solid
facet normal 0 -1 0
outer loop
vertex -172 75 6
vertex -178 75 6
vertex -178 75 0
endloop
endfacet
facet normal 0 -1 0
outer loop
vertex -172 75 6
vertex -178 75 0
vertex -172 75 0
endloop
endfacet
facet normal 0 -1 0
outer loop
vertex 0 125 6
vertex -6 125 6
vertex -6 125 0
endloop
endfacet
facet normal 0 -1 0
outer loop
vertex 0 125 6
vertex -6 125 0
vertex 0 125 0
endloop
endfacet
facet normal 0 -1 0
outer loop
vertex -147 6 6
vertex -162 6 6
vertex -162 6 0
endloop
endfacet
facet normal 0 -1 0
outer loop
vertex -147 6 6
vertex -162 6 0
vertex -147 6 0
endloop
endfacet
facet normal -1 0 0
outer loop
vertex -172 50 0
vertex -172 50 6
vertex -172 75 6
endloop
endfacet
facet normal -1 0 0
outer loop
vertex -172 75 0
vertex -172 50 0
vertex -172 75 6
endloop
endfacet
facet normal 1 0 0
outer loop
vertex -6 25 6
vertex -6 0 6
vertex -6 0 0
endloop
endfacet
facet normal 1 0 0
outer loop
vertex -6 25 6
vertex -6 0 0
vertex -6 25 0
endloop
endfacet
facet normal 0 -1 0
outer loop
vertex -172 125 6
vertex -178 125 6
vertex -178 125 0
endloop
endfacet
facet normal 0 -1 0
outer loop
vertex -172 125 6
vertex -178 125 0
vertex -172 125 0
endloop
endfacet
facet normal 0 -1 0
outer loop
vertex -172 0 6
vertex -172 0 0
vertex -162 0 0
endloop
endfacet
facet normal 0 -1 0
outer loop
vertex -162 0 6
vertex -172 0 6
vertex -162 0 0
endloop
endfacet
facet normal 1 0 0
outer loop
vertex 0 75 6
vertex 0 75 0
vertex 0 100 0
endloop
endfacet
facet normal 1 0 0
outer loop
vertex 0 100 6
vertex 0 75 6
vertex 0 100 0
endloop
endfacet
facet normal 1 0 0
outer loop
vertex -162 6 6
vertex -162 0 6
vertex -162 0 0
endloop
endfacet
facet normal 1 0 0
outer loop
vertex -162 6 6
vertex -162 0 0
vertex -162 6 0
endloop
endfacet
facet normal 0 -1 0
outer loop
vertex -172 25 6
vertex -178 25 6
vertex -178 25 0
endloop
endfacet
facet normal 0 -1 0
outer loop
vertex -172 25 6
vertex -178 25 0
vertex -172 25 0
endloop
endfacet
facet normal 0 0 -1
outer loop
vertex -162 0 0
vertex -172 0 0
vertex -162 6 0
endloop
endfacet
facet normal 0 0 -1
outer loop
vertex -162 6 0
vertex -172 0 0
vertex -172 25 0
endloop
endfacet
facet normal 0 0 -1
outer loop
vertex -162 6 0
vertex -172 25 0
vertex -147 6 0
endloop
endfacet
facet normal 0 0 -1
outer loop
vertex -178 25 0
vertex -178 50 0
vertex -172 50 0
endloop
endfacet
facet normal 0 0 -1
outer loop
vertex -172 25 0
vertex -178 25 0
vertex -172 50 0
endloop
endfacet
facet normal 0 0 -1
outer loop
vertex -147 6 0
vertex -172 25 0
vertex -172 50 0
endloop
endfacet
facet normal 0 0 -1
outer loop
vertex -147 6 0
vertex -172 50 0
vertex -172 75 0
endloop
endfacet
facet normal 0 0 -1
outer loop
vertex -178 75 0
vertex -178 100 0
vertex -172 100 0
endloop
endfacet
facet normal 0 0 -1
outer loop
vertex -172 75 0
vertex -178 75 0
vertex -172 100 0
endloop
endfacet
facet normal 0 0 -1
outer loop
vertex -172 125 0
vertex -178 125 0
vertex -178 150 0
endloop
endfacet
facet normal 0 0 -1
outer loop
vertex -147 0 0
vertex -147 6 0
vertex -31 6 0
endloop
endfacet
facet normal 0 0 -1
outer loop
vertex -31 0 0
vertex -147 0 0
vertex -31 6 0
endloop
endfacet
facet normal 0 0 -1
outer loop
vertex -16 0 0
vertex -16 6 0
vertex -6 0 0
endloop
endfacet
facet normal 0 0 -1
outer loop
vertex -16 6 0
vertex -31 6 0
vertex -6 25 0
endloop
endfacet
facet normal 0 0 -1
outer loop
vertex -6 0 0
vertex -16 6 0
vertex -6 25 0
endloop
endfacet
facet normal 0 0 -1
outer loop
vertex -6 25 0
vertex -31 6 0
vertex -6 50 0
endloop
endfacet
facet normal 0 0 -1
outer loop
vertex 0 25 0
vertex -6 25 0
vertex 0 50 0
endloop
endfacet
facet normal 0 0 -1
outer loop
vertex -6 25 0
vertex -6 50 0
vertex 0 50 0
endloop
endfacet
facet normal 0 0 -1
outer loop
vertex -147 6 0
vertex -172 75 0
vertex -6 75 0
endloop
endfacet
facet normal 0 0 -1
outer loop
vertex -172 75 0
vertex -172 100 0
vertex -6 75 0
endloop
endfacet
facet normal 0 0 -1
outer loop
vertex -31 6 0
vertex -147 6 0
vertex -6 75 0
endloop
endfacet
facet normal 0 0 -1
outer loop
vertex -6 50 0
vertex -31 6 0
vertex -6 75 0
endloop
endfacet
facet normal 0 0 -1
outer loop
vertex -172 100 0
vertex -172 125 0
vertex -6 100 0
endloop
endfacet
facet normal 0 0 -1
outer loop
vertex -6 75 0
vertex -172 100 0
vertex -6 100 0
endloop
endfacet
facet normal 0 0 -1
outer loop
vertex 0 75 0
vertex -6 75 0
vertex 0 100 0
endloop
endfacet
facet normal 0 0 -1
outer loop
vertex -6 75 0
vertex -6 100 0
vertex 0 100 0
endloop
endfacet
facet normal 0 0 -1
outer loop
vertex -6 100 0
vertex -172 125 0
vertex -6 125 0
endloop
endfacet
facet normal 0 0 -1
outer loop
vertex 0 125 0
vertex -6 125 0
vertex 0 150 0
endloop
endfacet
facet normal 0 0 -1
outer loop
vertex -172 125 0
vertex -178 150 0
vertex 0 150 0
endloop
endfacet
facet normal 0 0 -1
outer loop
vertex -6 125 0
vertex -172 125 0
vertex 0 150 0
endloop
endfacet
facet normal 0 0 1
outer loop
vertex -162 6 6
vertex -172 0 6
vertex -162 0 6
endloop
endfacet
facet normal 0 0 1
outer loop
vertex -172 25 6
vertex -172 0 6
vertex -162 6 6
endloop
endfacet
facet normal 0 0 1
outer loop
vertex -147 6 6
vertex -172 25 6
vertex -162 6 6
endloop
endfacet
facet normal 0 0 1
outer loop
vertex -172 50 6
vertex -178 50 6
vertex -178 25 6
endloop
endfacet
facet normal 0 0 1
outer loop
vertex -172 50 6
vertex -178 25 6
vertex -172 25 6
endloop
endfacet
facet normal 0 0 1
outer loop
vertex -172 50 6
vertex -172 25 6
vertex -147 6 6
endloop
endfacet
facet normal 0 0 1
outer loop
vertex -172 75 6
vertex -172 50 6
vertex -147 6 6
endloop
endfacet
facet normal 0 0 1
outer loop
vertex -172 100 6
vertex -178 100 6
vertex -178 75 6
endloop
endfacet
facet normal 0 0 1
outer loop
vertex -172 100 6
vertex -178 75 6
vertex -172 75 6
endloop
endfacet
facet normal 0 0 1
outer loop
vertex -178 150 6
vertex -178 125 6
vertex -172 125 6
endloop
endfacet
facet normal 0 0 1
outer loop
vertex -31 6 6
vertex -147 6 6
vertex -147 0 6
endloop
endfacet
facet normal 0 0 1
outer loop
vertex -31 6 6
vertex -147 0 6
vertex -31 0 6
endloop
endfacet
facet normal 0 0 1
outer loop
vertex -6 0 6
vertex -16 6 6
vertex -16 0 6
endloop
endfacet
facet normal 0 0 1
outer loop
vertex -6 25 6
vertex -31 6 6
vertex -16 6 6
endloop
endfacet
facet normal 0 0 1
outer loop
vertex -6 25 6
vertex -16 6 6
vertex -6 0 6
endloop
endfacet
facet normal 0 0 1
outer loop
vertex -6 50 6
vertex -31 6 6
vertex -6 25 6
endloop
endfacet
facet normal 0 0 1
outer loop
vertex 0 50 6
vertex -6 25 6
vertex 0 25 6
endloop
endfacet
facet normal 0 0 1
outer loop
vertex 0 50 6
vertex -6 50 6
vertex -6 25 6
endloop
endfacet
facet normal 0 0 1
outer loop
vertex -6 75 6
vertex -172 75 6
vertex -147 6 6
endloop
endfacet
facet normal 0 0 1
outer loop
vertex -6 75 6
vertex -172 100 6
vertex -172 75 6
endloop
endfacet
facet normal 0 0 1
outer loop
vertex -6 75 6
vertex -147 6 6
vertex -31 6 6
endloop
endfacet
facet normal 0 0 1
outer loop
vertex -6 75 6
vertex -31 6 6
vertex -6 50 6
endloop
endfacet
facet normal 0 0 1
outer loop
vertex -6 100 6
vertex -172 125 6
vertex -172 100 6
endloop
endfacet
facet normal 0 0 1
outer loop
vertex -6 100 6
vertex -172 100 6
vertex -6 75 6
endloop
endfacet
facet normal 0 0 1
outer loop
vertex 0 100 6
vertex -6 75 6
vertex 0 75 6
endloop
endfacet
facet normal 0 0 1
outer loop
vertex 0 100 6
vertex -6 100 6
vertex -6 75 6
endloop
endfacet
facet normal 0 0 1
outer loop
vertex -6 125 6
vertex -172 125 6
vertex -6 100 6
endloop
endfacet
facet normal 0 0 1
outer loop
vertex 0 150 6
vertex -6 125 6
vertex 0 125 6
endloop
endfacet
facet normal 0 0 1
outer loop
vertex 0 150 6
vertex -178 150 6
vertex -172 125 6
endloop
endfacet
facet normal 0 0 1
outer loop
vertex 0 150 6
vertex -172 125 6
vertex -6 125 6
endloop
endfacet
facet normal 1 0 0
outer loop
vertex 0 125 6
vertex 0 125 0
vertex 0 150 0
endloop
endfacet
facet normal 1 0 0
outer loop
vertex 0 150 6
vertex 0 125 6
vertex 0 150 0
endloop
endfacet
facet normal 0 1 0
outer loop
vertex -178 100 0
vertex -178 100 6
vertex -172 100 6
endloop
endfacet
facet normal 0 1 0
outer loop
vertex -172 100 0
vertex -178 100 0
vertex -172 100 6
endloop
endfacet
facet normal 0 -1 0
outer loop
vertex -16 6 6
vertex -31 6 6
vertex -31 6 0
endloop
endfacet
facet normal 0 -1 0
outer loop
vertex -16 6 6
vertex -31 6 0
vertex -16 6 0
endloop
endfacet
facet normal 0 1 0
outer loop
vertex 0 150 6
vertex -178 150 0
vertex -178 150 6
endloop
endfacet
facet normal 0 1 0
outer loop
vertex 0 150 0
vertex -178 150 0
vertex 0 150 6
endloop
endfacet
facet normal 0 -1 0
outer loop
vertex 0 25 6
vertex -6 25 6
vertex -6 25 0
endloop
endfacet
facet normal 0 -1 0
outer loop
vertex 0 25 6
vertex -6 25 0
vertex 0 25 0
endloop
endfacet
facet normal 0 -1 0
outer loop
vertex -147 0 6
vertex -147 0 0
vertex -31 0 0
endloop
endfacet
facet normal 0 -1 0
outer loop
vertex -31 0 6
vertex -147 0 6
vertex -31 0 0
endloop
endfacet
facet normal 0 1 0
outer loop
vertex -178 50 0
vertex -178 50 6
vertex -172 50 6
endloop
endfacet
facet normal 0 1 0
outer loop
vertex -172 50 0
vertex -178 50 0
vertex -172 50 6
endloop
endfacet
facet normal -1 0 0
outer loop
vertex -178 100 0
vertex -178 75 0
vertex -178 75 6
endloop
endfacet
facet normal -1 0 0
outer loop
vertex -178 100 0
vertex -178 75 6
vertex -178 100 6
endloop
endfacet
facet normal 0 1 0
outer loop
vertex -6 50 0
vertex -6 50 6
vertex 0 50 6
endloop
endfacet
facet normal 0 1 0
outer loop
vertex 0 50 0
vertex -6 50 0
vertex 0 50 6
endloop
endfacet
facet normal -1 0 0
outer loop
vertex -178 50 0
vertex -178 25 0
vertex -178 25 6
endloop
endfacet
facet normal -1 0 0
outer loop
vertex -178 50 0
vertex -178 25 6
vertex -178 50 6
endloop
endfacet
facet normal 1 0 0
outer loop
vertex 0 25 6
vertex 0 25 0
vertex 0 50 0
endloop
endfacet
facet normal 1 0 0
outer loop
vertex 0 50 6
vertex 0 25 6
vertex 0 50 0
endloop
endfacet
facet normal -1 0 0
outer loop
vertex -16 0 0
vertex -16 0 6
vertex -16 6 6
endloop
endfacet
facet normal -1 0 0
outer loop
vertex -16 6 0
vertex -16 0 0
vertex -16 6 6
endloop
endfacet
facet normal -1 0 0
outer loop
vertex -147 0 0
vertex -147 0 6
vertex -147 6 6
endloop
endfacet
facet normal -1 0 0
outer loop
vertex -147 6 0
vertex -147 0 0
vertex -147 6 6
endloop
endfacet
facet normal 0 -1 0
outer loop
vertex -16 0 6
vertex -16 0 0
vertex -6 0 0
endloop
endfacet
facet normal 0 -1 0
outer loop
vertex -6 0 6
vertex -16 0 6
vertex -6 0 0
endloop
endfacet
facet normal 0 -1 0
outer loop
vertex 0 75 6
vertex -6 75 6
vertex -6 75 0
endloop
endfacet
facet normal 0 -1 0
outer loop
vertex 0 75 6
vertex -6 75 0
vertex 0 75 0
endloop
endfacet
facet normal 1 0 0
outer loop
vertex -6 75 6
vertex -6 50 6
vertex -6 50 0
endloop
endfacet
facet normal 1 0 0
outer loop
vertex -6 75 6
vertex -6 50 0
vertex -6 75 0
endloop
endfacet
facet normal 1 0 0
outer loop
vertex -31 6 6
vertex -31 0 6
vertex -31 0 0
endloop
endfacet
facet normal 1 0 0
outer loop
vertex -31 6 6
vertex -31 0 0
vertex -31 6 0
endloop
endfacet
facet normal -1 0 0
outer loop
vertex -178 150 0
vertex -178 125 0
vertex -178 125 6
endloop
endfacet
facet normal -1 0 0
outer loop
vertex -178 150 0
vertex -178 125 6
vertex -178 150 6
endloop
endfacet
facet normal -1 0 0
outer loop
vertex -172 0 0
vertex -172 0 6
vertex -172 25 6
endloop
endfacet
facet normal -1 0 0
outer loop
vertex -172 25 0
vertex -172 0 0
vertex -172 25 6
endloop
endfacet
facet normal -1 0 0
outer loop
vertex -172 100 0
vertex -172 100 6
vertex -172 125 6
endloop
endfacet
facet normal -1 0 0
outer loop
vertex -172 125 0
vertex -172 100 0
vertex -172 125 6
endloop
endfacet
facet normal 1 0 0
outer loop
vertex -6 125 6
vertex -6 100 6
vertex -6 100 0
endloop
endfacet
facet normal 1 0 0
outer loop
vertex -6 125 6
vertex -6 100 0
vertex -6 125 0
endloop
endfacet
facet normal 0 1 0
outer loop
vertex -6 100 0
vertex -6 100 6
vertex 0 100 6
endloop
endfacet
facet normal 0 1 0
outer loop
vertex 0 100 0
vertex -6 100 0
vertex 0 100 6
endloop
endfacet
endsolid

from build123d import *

# Parameters (mm, degrees)
SKETCH1_W            = 178
SKETCH1_H            = 150
BOSS_EXTRUDE1_DEPTH  = 6
SKETCH2_W            = 6
SKETCH2_H            = 25
CUT_EXTRUDE1_DEPTH   = 6
LPATTERN1_COUNT      = 3
LPATTERN1_PITCH      = 50
LPATTERN1_COUNT_DIR2 = 2
LPATTERN1_PITCH_DIR2 = 172
SKETCH3_W            = 15
SKETCH3_H            = 6
CUT_EXTRUDE2_DEPTH   = 233.851884253


with BuildPart() as part:
    # Sketch1 → Boss-Extrude1 (new body)
    with BuildSketch(Plane.XY):
        with Locations((-89, 75)):
            Rectangle(SKETCH1_W, SKETCH1_H)
    extrude(amount=BOSS_EXTRUDE1_DEPTH)

    # Sketch2 → Cut-Extrude1 (cut)
    with BuildSketch(Plane.XY.offset(6)):
        with Locations((-175, 112.5)):
            Rectangle(SKETCH2_W, SKETCH2_H)
    cut_extrude1 = extrude(amount=-CUT_EXTRUDE1_DEPTH, mode=Mode.SUBTRACT)

    # LPattern1: Cut-Extrude1 3 × 2
    with Locations(*[(j * LPATTERN1_PITCH_DIR2, -i * LPATTERN1_PITCH, 0) for i in range(LPATTERN1_COUNT) for j in range(LPATTERN1_COUNT_DIR2) if (i, j) != (0, 0)]):
        add(cut_extrude1, mode=Mode.SUBTRACT)

    # Sketch3 → Cut-Extrude2 (cut, through all)
    with BuildSketch(Plane.XY.offset(6)):
        with Locations((-23.5, 3)):
            Rectangle(SKETCH3_W, SKETCH3_H)
        with Locations((-154.5, 3)):
            Rectangle(SKETCH3_W, SKETCH3_H)
    extrude(amount=-CUT_EXTRUDE2_DEPTH, mode=Mode.SUBTRACT)


solid = part.part
